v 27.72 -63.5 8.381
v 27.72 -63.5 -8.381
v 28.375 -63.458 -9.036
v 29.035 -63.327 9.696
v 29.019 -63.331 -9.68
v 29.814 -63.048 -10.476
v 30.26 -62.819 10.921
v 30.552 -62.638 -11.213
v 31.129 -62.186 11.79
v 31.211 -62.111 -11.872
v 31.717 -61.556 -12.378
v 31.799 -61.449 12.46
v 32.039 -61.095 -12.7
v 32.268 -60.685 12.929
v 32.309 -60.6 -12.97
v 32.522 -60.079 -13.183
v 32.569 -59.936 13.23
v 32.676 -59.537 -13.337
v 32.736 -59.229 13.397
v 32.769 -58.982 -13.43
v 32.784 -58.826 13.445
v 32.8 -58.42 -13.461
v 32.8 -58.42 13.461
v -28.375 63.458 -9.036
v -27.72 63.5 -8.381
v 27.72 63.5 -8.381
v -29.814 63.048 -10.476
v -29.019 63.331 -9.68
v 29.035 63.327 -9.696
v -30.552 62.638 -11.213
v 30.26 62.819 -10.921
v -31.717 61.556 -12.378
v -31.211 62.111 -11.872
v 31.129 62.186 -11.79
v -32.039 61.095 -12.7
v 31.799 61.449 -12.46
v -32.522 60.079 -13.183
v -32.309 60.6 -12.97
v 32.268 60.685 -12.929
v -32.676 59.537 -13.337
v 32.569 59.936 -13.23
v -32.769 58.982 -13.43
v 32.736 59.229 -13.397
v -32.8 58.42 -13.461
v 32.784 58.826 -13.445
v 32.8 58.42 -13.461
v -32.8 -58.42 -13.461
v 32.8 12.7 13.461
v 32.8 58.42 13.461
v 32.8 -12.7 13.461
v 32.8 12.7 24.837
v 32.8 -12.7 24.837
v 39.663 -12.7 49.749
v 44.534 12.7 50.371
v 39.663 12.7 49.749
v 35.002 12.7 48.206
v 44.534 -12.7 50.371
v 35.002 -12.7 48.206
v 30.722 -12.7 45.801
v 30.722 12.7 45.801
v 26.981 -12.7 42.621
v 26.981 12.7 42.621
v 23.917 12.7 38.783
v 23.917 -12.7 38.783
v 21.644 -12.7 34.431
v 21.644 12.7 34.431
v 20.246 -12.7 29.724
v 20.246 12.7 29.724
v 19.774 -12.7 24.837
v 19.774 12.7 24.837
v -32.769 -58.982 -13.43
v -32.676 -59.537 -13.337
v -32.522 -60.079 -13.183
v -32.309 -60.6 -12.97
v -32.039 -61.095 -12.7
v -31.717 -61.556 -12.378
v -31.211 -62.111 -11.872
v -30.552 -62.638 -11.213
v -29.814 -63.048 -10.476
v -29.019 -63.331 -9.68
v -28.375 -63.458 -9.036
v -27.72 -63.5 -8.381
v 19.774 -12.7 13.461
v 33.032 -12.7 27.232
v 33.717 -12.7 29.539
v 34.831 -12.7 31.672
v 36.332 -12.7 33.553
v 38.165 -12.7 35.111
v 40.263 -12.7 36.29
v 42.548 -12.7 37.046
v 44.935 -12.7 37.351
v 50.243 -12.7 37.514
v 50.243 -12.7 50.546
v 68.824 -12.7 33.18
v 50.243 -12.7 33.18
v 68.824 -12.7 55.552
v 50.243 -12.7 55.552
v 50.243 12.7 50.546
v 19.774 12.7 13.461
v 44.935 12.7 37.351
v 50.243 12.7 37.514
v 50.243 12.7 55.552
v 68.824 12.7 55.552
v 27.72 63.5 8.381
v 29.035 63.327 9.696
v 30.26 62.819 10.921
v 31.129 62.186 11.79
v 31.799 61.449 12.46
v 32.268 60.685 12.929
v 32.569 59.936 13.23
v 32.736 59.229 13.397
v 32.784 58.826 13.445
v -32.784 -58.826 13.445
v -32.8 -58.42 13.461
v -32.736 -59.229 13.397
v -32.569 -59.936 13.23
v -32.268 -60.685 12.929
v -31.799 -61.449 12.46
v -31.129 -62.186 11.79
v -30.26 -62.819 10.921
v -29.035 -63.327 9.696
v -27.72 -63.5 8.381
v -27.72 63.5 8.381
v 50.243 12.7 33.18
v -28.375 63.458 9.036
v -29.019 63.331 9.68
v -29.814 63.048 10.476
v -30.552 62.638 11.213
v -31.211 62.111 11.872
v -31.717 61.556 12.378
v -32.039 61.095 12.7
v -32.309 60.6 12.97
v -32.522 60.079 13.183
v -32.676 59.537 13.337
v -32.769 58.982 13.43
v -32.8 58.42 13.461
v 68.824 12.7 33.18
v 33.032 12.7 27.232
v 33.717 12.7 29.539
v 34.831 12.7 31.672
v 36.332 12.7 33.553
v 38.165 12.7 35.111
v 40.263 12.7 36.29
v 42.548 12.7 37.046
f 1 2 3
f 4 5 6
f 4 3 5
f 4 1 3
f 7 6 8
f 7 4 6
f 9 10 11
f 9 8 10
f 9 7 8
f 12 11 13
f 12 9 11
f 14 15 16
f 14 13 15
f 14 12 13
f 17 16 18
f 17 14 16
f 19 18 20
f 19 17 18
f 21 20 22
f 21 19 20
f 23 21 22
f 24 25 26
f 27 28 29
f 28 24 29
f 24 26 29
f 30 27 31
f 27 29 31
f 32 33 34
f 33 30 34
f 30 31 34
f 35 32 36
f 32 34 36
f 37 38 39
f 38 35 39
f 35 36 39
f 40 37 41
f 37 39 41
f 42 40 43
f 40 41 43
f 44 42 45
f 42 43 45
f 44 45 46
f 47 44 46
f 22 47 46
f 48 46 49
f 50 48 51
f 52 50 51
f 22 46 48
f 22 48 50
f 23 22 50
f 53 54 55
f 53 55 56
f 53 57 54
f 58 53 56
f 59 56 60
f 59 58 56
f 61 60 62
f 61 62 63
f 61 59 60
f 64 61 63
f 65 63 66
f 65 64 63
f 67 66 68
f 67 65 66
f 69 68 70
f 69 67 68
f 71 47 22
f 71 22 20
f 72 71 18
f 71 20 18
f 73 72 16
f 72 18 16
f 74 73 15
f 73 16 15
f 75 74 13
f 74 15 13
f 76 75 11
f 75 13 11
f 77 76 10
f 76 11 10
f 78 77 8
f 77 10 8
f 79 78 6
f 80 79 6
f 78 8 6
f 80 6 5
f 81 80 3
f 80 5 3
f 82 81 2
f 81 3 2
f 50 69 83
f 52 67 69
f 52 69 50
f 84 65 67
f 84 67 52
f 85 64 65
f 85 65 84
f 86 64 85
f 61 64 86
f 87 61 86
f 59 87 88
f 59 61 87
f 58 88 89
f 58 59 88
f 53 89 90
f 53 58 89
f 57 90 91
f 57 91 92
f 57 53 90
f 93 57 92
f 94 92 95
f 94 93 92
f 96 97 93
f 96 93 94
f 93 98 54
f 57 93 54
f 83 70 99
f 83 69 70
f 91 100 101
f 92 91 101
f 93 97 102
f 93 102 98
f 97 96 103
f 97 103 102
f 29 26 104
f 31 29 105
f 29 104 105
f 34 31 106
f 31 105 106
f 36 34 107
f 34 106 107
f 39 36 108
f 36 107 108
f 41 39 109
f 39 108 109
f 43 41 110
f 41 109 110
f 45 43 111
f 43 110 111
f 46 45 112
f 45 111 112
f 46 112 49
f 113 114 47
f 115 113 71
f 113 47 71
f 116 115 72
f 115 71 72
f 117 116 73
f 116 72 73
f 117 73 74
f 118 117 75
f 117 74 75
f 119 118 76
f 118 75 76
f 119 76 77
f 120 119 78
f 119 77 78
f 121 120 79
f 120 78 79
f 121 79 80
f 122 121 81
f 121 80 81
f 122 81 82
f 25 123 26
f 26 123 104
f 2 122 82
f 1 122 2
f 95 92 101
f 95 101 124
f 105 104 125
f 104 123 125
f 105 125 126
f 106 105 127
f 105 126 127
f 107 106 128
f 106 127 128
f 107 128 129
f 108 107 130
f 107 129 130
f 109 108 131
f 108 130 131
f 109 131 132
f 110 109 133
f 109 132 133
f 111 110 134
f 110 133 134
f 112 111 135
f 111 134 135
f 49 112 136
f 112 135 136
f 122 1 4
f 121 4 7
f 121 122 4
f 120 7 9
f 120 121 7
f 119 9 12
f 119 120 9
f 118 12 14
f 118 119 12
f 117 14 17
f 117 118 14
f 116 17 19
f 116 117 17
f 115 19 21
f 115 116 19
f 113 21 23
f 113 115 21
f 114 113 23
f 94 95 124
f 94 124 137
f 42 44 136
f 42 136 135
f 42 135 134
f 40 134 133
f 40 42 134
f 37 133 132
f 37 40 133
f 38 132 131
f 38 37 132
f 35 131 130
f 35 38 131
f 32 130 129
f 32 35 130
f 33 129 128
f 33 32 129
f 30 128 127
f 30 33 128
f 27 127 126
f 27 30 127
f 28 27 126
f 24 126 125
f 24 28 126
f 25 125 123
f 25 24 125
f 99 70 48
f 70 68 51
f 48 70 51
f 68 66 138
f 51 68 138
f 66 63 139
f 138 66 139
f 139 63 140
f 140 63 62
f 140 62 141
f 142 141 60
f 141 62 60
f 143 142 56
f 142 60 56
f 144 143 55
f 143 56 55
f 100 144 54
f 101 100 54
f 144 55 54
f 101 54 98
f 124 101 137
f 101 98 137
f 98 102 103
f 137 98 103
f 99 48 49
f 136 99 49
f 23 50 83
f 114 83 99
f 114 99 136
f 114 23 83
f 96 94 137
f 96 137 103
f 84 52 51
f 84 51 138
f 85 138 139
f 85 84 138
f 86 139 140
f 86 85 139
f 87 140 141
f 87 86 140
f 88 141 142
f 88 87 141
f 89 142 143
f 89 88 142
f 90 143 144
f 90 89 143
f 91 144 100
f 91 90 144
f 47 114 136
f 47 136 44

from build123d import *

# Parameters (mm, degrees)
F1_DEPTH = 63.5
F2_DEPTH = 12.7
F3_R     = 5.08


with BuildPart() as f1:
    # F0 (on Front) → F1 (new body, symmetric)
    with BuildSketch(Plane.XZ):
        Polygon((19.77428763, 13.4614007547), (-32.80030936, 13.4614007547), (-32.80030936, -13.4614007547), (32.80030936, -13.4614007547), (32.80030936, 13.4614007547), align=None)
    extrude(amount=F1_DEPTH, both=True)

    # F0 (on Front) → F2 (join, symmetric)
    with BuildSketch(Plane.XZ):
        with BuildLine():
            Line((19.77428763, 24.8372294009), (19.77428763, 13.4614007547))
            Line((19.77428763, 13.4614007547), (32.80030936, 13.4614007547))
            Line((32.80030936, 13.4614007547), (32.80030936, 24.8372294009))
            ThreePointArc((32.80030936, 24.8372294009), (36.3320089212, 33.5525140508), (44.9345260859, 37.3506434262))
            Line((44.9345260859, 37.3506434262), (50.2432473004, 37.5140286498))
            Line((50.2432473004, 37.5140286498), (50.2432473004, 50.5462181007))
            Line((50.2432473004, 50.5462181007), (44.533817111, 50.3705003543))
            ThreePointArc((44.533817111, 50.3705003543), (26.9806216999, 42.6205237084), (19.77428763, 24.8372294009))
        make_face()
        Polygon((59.8447506625, 37.809531787), (50.2432473004, 37.5140286498), (50.2432473004, 33.1795029342), (59.9276782147, 33.1795029342), align=None)
        Polygon((59.5269692399, 55.5519722402), (59.8447506625, 37.809531787), (59.9276782147, 33.1795029342), (68.8237734139, 33.1795029342), (68.8237734139, 55.5519722402), align=None)
        Polygon((50.2432473004, 55.5519722402), (50.2432473004, 50.5462181007), (50.2432473004, 37.5140286498), (59.8447506625, 37.809531787), (59.5269692399, 55.5519722402), align=None)
    extrude(amount=F2_DEPTH, both=True)

    # F3
    f3_edges = [f1.edges().sort_by_distance(p)[0] for p in [
        (0, -63.5, 13.461401),
        (-32.800309, -63.5, 0),
        (0, -63.5, -13.461401),
        (32.800309, -63.5, 0),
        (-32.800309, 63.5, 0),
        (0, 63.5, -13.461401),
        (32.800309, 63.5, 0),
        (0, 63.5, 13.461401),
    ]]
    fillet(f3_edges, radius=F3_R)


solid = f1.part
